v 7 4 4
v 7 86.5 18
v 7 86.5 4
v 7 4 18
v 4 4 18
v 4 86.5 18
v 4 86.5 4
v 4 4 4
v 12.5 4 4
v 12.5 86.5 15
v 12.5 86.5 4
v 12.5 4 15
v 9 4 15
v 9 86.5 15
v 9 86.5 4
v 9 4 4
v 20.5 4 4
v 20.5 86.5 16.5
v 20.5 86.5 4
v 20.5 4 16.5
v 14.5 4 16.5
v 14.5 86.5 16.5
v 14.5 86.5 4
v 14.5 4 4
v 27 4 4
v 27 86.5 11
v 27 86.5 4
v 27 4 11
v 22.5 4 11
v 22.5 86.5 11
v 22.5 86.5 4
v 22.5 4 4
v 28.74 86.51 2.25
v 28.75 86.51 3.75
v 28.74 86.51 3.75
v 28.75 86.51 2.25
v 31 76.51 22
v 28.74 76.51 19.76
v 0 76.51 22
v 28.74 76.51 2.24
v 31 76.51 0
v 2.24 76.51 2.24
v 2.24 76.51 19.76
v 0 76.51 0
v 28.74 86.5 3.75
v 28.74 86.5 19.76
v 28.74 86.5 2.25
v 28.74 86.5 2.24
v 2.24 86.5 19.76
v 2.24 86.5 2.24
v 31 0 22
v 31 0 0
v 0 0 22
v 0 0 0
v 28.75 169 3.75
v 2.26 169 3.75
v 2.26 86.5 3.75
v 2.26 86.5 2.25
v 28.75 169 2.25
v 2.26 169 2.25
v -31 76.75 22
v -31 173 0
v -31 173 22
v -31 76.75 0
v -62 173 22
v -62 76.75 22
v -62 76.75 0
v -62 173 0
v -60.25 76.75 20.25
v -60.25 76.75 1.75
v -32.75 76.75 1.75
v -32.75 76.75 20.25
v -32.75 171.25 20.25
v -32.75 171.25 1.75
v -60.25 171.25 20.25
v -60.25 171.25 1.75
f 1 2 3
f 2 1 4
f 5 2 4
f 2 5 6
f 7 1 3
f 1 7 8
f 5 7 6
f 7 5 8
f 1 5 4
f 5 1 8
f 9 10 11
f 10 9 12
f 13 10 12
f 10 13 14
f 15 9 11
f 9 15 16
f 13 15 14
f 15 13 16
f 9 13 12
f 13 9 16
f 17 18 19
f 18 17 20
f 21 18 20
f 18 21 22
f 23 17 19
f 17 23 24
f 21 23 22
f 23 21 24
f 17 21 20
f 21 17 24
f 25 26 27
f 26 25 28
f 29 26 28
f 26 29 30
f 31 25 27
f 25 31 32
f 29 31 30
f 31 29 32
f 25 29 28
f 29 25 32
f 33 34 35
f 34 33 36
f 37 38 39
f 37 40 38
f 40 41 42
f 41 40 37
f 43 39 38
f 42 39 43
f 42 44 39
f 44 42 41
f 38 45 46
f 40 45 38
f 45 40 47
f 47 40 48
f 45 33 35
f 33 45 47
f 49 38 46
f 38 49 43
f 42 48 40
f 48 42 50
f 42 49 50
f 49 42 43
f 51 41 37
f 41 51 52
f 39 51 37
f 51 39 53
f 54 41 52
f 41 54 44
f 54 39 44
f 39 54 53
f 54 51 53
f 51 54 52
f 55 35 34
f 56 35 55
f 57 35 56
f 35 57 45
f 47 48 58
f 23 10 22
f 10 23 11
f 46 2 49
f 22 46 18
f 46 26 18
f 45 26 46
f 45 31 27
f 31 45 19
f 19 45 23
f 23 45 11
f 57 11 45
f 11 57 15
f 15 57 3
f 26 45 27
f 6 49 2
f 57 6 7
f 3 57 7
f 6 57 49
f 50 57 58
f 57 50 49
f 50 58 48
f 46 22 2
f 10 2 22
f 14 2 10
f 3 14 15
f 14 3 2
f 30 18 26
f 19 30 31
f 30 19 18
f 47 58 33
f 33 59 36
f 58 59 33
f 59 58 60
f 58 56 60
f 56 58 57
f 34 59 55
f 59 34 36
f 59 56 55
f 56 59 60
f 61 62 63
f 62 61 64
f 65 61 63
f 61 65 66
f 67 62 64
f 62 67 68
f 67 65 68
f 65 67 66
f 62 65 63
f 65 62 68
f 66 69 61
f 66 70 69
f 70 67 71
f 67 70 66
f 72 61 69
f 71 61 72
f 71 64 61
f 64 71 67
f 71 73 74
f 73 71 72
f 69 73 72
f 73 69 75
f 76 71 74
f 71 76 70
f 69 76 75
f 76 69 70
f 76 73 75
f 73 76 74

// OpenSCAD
$fn = 180;
eps =  0.01;
tol = 0.25;

function sum(arr,i=0,s=0) =
    i < len(arr) ?
    sum(arr,i+1,s+arr[i]) :
    s;
 
function sum_c(arr,c,i=0,s=0) =
    i < len(arr) ?
    sum_c(arr,c,i+1,s+arr[i][c]) :
    s;

function sum_cl(arr,c,l,i=0,s=0) =
    i < l ?
    sum_cl(arr,c,l,i+1,s+arr[i][c]) :
    s;
    
function max_c(arr,c,i=0,m=0) =
    i < len(arr) ?
    max_c(arr,c,i+1,max([m,arr[i][c]])) :
    m;

// scalpel parameters
sp =    [
        [3.0,165,14.0],
        [3.5,165,11.0],
        [6.0,145,12.5],
        [4.5,125, 7.0]
        ];

// scalpel case parameters
wt = 4;
// scalpel distances
sd = 2;

lh = 10;

module scalpel_case()
{
    _x = 2*wt+(len(sp)-1)*sd+sum_c(sp,0);
    _y = 2*wt+max_c(sp,1);
    _z = 2*wt+max_c(sp,2);


    difference()
    {
        // main box
        cube([_x,_y,_z]);
        
        // middle part cut
        translate([-eps,_y/2,wt-tol]) cube([_x+2*eps,_y,_z]);
        
        // lower cut
        translate([-eps,_y/2,-_z+wt/2+tol]) cube([_x+2*eps,_y,_z]);
        
        // left cut
        translate([-eps,_y/2,0]) cube([wt/2+2*eps+tol,_y+tol,_z]); 
        
        // right cut
        translate([_x-wt/2-tol,_y/2,0]) cube([wt/2+tol+eps,_y+tol,_z]);
        
        // upper cut
        translate([0,_y-wt,0]) cube([_x,_y,_z]);
        
        // scalpel case cuts
        for(i=[0:len(sp)-1])
        {
            _cx = sp[i][0];
            _cy = sp[i][1];
            _cz = sp[i][2];
            
            _cxo = wt+sum_cl(sp,0,i)+i*sd;
            translate([_cxo,wt,wt]) cube([_cx,_cy,_cz]);
        }
        
        // cut for scalpel
        translate([-eps,_y/2-lh+eps,-eps])
        difference()
        {
            cube([_x+2*eps,lh,_z+2*eps]);
            translate([wt/2+tol,-eps,wt/2+tol])
                cube([_x-wt-2*tol,lh+2*eps,_z+2*eps-wt-2*tol]);
        }
    
    }
    
    // cover
    translate([-2*_x,0,0])
    difference()
    {
        // basic shape
        cube([_x,_y,_z]);
        translate([-eps,-_y/2+tol-lh,-eps])
            cube([_x+2*eps,_y,_z+2*eps]);
        translate([wt/2-tol,-wt/2+tol,wt/2-tol])
            cube([_x-wt+2*tol,_y,_z-wt+2*tol]);
    }
    
    
}

scalpel_case();
